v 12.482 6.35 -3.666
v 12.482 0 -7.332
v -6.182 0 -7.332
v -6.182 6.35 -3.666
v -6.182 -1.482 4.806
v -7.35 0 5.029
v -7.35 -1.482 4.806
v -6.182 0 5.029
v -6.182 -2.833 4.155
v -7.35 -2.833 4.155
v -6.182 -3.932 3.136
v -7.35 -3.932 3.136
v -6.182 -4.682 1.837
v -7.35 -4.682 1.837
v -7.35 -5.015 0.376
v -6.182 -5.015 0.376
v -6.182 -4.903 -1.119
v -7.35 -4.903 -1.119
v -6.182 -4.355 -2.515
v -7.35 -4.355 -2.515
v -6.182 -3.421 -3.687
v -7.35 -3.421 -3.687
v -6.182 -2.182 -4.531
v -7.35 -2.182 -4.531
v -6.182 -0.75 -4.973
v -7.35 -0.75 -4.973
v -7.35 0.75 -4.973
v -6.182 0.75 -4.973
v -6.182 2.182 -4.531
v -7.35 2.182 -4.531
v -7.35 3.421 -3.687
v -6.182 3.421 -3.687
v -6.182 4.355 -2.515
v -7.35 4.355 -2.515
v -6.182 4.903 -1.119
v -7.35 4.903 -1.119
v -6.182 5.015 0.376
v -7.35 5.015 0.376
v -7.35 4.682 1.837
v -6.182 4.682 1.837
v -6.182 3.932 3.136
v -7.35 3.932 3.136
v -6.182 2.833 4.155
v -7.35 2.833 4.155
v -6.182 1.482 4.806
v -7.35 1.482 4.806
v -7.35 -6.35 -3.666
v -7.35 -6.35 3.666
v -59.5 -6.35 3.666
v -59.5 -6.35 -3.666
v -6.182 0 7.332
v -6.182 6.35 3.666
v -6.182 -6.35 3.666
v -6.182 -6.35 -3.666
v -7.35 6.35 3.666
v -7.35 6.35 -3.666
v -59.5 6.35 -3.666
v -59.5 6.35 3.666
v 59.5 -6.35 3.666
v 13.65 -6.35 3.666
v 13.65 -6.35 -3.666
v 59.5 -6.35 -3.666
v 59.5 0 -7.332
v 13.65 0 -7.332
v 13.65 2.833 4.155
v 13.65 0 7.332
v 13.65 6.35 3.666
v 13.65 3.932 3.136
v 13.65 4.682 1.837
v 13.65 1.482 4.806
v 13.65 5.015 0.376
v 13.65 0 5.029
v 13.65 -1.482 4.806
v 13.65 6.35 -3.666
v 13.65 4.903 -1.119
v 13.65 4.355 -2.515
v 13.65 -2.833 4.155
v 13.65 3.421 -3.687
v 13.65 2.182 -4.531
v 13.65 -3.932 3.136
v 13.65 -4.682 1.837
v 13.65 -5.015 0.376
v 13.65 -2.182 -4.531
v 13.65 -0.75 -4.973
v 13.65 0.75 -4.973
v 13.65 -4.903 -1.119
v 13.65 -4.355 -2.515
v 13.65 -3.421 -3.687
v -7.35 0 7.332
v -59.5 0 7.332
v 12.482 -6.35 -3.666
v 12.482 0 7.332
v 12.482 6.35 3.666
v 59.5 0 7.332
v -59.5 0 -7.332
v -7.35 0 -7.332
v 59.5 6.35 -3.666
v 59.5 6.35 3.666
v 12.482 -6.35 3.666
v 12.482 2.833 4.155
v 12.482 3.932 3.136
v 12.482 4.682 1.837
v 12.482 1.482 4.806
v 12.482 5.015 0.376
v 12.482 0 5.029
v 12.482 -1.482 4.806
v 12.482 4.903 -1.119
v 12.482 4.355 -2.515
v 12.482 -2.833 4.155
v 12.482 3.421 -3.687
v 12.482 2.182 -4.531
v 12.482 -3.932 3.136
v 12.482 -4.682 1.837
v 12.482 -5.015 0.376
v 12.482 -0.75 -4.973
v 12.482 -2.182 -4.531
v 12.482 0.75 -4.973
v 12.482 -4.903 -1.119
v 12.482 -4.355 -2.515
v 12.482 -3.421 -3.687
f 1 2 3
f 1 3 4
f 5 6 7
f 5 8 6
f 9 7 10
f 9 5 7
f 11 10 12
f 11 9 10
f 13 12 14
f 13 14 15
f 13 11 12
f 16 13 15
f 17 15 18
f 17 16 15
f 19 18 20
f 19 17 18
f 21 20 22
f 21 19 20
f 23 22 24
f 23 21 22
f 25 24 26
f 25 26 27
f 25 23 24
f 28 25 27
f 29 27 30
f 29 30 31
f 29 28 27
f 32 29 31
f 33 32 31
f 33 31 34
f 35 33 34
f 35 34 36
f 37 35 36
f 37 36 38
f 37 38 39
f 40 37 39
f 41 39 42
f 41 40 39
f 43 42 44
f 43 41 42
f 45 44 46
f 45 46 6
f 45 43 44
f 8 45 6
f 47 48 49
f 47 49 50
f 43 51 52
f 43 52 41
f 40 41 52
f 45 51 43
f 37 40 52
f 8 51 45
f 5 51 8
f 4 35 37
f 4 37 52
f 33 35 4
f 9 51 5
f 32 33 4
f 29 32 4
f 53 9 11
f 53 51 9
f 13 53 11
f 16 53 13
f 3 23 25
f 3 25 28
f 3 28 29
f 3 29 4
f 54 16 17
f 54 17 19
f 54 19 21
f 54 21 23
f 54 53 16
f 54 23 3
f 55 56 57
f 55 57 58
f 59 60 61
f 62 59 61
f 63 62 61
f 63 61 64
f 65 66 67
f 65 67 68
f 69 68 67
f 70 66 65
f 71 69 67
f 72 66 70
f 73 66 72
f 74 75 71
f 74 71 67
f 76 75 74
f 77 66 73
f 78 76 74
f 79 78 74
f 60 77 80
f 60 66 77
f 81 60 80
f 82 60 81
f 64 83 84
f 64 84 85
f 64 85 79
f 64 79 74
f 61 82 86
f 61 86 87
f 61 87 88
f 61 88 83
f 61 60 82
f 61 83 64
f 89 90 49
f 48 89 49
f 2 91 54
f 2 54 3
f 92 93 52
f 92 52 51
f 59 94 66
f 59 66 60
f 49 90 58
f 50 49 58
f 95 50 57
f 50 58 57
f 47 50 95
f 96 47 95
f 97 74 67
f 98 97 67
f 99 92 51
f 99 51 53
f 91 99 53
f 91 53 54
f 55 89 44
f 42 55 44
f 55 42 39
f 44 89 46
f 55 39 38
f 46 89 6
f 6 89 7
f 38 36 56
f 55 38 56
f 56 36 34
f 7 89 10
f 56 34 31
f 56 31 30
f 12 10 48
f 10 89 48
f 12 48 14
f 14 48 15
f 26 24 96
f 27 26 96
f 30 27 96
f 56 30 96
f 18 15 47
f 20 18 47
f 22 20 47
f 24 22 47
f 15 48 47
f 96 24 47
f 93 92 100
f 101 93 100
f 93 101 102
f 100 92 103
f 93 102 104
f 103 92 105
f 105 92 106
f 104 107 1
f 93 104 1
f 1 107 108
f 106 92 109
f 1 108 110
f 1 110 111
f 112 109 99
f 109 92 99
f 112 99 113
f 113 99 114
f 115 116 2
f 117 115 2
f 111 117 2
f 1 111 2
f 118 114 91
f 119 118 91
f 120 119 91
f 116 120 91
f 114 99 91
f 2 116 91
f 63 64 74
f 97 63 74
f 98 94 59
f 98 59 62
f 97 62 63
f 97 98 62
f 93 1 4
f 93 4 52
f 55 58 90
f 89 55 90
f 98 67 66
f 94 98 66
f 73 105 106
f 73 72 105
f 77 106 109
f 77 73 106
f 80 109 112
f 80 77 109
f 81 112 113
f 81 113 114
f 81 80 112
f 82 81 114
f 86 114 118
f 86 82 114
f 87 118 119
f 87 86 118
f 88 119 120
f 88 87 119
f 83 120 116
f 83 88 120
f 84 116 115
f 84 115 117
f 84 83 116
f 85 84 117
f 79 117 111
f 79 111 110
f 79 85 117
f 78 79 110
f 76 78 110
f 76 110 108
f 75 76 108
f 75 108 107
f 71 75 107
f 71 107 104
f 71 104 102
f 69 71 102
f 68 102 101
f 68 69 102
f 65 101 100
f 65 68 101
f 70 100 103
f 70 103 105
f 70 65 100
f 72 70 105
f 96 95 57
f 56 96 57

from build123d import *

# Parameters (mm, degrees)
BOSS_EXTRUDE1_DEPTH = 59.5
SKETCH5_W           = 1.1684
SKETCH5_H           = 8.939323218


with BuildPart() as part:
    # Sketch2 → Boss-Extrude1 (new, symmetric)
    with BuildSketch(Plane(origin=(0, 0, 0), x_dir=(0, 0, -1), z_dir=(1, 0, 0))):
        Polygon((7.332348419, 0), (3.666174209, 6.35), (-3.666174209, 6.35), (-7.332348419, 0), (-3.666174209, -6.35), (3.666174209, -6.35), align=None)
    extrude(amount=BOSS_EXTRUDE1_DEPTH, both=True)

    # Sketch5 → Cut-Revolve1 (revolve, cut)
    with BuildSketch(Plane.XY, mode=Mode.PRIVATE) as cut_revolve1_sk:
        with Locations((13.0658, 9.498861609)):
            Rectangle(SKETCH5_W, SKETCH5_H)
        with Locations((-6.7658, 9.498861609)):
            Rectangle(SKETCH5_W, SKETCH5_H)
    revolve(cut_revolve1_sk.sketch.rotate(Axis((0, 0, 0), (1, 0, 0)), 90), axis=Axis((0, 0, 0), (1, 0, 0)), mode=Mode.SUBTRACT)


solid = part.part
